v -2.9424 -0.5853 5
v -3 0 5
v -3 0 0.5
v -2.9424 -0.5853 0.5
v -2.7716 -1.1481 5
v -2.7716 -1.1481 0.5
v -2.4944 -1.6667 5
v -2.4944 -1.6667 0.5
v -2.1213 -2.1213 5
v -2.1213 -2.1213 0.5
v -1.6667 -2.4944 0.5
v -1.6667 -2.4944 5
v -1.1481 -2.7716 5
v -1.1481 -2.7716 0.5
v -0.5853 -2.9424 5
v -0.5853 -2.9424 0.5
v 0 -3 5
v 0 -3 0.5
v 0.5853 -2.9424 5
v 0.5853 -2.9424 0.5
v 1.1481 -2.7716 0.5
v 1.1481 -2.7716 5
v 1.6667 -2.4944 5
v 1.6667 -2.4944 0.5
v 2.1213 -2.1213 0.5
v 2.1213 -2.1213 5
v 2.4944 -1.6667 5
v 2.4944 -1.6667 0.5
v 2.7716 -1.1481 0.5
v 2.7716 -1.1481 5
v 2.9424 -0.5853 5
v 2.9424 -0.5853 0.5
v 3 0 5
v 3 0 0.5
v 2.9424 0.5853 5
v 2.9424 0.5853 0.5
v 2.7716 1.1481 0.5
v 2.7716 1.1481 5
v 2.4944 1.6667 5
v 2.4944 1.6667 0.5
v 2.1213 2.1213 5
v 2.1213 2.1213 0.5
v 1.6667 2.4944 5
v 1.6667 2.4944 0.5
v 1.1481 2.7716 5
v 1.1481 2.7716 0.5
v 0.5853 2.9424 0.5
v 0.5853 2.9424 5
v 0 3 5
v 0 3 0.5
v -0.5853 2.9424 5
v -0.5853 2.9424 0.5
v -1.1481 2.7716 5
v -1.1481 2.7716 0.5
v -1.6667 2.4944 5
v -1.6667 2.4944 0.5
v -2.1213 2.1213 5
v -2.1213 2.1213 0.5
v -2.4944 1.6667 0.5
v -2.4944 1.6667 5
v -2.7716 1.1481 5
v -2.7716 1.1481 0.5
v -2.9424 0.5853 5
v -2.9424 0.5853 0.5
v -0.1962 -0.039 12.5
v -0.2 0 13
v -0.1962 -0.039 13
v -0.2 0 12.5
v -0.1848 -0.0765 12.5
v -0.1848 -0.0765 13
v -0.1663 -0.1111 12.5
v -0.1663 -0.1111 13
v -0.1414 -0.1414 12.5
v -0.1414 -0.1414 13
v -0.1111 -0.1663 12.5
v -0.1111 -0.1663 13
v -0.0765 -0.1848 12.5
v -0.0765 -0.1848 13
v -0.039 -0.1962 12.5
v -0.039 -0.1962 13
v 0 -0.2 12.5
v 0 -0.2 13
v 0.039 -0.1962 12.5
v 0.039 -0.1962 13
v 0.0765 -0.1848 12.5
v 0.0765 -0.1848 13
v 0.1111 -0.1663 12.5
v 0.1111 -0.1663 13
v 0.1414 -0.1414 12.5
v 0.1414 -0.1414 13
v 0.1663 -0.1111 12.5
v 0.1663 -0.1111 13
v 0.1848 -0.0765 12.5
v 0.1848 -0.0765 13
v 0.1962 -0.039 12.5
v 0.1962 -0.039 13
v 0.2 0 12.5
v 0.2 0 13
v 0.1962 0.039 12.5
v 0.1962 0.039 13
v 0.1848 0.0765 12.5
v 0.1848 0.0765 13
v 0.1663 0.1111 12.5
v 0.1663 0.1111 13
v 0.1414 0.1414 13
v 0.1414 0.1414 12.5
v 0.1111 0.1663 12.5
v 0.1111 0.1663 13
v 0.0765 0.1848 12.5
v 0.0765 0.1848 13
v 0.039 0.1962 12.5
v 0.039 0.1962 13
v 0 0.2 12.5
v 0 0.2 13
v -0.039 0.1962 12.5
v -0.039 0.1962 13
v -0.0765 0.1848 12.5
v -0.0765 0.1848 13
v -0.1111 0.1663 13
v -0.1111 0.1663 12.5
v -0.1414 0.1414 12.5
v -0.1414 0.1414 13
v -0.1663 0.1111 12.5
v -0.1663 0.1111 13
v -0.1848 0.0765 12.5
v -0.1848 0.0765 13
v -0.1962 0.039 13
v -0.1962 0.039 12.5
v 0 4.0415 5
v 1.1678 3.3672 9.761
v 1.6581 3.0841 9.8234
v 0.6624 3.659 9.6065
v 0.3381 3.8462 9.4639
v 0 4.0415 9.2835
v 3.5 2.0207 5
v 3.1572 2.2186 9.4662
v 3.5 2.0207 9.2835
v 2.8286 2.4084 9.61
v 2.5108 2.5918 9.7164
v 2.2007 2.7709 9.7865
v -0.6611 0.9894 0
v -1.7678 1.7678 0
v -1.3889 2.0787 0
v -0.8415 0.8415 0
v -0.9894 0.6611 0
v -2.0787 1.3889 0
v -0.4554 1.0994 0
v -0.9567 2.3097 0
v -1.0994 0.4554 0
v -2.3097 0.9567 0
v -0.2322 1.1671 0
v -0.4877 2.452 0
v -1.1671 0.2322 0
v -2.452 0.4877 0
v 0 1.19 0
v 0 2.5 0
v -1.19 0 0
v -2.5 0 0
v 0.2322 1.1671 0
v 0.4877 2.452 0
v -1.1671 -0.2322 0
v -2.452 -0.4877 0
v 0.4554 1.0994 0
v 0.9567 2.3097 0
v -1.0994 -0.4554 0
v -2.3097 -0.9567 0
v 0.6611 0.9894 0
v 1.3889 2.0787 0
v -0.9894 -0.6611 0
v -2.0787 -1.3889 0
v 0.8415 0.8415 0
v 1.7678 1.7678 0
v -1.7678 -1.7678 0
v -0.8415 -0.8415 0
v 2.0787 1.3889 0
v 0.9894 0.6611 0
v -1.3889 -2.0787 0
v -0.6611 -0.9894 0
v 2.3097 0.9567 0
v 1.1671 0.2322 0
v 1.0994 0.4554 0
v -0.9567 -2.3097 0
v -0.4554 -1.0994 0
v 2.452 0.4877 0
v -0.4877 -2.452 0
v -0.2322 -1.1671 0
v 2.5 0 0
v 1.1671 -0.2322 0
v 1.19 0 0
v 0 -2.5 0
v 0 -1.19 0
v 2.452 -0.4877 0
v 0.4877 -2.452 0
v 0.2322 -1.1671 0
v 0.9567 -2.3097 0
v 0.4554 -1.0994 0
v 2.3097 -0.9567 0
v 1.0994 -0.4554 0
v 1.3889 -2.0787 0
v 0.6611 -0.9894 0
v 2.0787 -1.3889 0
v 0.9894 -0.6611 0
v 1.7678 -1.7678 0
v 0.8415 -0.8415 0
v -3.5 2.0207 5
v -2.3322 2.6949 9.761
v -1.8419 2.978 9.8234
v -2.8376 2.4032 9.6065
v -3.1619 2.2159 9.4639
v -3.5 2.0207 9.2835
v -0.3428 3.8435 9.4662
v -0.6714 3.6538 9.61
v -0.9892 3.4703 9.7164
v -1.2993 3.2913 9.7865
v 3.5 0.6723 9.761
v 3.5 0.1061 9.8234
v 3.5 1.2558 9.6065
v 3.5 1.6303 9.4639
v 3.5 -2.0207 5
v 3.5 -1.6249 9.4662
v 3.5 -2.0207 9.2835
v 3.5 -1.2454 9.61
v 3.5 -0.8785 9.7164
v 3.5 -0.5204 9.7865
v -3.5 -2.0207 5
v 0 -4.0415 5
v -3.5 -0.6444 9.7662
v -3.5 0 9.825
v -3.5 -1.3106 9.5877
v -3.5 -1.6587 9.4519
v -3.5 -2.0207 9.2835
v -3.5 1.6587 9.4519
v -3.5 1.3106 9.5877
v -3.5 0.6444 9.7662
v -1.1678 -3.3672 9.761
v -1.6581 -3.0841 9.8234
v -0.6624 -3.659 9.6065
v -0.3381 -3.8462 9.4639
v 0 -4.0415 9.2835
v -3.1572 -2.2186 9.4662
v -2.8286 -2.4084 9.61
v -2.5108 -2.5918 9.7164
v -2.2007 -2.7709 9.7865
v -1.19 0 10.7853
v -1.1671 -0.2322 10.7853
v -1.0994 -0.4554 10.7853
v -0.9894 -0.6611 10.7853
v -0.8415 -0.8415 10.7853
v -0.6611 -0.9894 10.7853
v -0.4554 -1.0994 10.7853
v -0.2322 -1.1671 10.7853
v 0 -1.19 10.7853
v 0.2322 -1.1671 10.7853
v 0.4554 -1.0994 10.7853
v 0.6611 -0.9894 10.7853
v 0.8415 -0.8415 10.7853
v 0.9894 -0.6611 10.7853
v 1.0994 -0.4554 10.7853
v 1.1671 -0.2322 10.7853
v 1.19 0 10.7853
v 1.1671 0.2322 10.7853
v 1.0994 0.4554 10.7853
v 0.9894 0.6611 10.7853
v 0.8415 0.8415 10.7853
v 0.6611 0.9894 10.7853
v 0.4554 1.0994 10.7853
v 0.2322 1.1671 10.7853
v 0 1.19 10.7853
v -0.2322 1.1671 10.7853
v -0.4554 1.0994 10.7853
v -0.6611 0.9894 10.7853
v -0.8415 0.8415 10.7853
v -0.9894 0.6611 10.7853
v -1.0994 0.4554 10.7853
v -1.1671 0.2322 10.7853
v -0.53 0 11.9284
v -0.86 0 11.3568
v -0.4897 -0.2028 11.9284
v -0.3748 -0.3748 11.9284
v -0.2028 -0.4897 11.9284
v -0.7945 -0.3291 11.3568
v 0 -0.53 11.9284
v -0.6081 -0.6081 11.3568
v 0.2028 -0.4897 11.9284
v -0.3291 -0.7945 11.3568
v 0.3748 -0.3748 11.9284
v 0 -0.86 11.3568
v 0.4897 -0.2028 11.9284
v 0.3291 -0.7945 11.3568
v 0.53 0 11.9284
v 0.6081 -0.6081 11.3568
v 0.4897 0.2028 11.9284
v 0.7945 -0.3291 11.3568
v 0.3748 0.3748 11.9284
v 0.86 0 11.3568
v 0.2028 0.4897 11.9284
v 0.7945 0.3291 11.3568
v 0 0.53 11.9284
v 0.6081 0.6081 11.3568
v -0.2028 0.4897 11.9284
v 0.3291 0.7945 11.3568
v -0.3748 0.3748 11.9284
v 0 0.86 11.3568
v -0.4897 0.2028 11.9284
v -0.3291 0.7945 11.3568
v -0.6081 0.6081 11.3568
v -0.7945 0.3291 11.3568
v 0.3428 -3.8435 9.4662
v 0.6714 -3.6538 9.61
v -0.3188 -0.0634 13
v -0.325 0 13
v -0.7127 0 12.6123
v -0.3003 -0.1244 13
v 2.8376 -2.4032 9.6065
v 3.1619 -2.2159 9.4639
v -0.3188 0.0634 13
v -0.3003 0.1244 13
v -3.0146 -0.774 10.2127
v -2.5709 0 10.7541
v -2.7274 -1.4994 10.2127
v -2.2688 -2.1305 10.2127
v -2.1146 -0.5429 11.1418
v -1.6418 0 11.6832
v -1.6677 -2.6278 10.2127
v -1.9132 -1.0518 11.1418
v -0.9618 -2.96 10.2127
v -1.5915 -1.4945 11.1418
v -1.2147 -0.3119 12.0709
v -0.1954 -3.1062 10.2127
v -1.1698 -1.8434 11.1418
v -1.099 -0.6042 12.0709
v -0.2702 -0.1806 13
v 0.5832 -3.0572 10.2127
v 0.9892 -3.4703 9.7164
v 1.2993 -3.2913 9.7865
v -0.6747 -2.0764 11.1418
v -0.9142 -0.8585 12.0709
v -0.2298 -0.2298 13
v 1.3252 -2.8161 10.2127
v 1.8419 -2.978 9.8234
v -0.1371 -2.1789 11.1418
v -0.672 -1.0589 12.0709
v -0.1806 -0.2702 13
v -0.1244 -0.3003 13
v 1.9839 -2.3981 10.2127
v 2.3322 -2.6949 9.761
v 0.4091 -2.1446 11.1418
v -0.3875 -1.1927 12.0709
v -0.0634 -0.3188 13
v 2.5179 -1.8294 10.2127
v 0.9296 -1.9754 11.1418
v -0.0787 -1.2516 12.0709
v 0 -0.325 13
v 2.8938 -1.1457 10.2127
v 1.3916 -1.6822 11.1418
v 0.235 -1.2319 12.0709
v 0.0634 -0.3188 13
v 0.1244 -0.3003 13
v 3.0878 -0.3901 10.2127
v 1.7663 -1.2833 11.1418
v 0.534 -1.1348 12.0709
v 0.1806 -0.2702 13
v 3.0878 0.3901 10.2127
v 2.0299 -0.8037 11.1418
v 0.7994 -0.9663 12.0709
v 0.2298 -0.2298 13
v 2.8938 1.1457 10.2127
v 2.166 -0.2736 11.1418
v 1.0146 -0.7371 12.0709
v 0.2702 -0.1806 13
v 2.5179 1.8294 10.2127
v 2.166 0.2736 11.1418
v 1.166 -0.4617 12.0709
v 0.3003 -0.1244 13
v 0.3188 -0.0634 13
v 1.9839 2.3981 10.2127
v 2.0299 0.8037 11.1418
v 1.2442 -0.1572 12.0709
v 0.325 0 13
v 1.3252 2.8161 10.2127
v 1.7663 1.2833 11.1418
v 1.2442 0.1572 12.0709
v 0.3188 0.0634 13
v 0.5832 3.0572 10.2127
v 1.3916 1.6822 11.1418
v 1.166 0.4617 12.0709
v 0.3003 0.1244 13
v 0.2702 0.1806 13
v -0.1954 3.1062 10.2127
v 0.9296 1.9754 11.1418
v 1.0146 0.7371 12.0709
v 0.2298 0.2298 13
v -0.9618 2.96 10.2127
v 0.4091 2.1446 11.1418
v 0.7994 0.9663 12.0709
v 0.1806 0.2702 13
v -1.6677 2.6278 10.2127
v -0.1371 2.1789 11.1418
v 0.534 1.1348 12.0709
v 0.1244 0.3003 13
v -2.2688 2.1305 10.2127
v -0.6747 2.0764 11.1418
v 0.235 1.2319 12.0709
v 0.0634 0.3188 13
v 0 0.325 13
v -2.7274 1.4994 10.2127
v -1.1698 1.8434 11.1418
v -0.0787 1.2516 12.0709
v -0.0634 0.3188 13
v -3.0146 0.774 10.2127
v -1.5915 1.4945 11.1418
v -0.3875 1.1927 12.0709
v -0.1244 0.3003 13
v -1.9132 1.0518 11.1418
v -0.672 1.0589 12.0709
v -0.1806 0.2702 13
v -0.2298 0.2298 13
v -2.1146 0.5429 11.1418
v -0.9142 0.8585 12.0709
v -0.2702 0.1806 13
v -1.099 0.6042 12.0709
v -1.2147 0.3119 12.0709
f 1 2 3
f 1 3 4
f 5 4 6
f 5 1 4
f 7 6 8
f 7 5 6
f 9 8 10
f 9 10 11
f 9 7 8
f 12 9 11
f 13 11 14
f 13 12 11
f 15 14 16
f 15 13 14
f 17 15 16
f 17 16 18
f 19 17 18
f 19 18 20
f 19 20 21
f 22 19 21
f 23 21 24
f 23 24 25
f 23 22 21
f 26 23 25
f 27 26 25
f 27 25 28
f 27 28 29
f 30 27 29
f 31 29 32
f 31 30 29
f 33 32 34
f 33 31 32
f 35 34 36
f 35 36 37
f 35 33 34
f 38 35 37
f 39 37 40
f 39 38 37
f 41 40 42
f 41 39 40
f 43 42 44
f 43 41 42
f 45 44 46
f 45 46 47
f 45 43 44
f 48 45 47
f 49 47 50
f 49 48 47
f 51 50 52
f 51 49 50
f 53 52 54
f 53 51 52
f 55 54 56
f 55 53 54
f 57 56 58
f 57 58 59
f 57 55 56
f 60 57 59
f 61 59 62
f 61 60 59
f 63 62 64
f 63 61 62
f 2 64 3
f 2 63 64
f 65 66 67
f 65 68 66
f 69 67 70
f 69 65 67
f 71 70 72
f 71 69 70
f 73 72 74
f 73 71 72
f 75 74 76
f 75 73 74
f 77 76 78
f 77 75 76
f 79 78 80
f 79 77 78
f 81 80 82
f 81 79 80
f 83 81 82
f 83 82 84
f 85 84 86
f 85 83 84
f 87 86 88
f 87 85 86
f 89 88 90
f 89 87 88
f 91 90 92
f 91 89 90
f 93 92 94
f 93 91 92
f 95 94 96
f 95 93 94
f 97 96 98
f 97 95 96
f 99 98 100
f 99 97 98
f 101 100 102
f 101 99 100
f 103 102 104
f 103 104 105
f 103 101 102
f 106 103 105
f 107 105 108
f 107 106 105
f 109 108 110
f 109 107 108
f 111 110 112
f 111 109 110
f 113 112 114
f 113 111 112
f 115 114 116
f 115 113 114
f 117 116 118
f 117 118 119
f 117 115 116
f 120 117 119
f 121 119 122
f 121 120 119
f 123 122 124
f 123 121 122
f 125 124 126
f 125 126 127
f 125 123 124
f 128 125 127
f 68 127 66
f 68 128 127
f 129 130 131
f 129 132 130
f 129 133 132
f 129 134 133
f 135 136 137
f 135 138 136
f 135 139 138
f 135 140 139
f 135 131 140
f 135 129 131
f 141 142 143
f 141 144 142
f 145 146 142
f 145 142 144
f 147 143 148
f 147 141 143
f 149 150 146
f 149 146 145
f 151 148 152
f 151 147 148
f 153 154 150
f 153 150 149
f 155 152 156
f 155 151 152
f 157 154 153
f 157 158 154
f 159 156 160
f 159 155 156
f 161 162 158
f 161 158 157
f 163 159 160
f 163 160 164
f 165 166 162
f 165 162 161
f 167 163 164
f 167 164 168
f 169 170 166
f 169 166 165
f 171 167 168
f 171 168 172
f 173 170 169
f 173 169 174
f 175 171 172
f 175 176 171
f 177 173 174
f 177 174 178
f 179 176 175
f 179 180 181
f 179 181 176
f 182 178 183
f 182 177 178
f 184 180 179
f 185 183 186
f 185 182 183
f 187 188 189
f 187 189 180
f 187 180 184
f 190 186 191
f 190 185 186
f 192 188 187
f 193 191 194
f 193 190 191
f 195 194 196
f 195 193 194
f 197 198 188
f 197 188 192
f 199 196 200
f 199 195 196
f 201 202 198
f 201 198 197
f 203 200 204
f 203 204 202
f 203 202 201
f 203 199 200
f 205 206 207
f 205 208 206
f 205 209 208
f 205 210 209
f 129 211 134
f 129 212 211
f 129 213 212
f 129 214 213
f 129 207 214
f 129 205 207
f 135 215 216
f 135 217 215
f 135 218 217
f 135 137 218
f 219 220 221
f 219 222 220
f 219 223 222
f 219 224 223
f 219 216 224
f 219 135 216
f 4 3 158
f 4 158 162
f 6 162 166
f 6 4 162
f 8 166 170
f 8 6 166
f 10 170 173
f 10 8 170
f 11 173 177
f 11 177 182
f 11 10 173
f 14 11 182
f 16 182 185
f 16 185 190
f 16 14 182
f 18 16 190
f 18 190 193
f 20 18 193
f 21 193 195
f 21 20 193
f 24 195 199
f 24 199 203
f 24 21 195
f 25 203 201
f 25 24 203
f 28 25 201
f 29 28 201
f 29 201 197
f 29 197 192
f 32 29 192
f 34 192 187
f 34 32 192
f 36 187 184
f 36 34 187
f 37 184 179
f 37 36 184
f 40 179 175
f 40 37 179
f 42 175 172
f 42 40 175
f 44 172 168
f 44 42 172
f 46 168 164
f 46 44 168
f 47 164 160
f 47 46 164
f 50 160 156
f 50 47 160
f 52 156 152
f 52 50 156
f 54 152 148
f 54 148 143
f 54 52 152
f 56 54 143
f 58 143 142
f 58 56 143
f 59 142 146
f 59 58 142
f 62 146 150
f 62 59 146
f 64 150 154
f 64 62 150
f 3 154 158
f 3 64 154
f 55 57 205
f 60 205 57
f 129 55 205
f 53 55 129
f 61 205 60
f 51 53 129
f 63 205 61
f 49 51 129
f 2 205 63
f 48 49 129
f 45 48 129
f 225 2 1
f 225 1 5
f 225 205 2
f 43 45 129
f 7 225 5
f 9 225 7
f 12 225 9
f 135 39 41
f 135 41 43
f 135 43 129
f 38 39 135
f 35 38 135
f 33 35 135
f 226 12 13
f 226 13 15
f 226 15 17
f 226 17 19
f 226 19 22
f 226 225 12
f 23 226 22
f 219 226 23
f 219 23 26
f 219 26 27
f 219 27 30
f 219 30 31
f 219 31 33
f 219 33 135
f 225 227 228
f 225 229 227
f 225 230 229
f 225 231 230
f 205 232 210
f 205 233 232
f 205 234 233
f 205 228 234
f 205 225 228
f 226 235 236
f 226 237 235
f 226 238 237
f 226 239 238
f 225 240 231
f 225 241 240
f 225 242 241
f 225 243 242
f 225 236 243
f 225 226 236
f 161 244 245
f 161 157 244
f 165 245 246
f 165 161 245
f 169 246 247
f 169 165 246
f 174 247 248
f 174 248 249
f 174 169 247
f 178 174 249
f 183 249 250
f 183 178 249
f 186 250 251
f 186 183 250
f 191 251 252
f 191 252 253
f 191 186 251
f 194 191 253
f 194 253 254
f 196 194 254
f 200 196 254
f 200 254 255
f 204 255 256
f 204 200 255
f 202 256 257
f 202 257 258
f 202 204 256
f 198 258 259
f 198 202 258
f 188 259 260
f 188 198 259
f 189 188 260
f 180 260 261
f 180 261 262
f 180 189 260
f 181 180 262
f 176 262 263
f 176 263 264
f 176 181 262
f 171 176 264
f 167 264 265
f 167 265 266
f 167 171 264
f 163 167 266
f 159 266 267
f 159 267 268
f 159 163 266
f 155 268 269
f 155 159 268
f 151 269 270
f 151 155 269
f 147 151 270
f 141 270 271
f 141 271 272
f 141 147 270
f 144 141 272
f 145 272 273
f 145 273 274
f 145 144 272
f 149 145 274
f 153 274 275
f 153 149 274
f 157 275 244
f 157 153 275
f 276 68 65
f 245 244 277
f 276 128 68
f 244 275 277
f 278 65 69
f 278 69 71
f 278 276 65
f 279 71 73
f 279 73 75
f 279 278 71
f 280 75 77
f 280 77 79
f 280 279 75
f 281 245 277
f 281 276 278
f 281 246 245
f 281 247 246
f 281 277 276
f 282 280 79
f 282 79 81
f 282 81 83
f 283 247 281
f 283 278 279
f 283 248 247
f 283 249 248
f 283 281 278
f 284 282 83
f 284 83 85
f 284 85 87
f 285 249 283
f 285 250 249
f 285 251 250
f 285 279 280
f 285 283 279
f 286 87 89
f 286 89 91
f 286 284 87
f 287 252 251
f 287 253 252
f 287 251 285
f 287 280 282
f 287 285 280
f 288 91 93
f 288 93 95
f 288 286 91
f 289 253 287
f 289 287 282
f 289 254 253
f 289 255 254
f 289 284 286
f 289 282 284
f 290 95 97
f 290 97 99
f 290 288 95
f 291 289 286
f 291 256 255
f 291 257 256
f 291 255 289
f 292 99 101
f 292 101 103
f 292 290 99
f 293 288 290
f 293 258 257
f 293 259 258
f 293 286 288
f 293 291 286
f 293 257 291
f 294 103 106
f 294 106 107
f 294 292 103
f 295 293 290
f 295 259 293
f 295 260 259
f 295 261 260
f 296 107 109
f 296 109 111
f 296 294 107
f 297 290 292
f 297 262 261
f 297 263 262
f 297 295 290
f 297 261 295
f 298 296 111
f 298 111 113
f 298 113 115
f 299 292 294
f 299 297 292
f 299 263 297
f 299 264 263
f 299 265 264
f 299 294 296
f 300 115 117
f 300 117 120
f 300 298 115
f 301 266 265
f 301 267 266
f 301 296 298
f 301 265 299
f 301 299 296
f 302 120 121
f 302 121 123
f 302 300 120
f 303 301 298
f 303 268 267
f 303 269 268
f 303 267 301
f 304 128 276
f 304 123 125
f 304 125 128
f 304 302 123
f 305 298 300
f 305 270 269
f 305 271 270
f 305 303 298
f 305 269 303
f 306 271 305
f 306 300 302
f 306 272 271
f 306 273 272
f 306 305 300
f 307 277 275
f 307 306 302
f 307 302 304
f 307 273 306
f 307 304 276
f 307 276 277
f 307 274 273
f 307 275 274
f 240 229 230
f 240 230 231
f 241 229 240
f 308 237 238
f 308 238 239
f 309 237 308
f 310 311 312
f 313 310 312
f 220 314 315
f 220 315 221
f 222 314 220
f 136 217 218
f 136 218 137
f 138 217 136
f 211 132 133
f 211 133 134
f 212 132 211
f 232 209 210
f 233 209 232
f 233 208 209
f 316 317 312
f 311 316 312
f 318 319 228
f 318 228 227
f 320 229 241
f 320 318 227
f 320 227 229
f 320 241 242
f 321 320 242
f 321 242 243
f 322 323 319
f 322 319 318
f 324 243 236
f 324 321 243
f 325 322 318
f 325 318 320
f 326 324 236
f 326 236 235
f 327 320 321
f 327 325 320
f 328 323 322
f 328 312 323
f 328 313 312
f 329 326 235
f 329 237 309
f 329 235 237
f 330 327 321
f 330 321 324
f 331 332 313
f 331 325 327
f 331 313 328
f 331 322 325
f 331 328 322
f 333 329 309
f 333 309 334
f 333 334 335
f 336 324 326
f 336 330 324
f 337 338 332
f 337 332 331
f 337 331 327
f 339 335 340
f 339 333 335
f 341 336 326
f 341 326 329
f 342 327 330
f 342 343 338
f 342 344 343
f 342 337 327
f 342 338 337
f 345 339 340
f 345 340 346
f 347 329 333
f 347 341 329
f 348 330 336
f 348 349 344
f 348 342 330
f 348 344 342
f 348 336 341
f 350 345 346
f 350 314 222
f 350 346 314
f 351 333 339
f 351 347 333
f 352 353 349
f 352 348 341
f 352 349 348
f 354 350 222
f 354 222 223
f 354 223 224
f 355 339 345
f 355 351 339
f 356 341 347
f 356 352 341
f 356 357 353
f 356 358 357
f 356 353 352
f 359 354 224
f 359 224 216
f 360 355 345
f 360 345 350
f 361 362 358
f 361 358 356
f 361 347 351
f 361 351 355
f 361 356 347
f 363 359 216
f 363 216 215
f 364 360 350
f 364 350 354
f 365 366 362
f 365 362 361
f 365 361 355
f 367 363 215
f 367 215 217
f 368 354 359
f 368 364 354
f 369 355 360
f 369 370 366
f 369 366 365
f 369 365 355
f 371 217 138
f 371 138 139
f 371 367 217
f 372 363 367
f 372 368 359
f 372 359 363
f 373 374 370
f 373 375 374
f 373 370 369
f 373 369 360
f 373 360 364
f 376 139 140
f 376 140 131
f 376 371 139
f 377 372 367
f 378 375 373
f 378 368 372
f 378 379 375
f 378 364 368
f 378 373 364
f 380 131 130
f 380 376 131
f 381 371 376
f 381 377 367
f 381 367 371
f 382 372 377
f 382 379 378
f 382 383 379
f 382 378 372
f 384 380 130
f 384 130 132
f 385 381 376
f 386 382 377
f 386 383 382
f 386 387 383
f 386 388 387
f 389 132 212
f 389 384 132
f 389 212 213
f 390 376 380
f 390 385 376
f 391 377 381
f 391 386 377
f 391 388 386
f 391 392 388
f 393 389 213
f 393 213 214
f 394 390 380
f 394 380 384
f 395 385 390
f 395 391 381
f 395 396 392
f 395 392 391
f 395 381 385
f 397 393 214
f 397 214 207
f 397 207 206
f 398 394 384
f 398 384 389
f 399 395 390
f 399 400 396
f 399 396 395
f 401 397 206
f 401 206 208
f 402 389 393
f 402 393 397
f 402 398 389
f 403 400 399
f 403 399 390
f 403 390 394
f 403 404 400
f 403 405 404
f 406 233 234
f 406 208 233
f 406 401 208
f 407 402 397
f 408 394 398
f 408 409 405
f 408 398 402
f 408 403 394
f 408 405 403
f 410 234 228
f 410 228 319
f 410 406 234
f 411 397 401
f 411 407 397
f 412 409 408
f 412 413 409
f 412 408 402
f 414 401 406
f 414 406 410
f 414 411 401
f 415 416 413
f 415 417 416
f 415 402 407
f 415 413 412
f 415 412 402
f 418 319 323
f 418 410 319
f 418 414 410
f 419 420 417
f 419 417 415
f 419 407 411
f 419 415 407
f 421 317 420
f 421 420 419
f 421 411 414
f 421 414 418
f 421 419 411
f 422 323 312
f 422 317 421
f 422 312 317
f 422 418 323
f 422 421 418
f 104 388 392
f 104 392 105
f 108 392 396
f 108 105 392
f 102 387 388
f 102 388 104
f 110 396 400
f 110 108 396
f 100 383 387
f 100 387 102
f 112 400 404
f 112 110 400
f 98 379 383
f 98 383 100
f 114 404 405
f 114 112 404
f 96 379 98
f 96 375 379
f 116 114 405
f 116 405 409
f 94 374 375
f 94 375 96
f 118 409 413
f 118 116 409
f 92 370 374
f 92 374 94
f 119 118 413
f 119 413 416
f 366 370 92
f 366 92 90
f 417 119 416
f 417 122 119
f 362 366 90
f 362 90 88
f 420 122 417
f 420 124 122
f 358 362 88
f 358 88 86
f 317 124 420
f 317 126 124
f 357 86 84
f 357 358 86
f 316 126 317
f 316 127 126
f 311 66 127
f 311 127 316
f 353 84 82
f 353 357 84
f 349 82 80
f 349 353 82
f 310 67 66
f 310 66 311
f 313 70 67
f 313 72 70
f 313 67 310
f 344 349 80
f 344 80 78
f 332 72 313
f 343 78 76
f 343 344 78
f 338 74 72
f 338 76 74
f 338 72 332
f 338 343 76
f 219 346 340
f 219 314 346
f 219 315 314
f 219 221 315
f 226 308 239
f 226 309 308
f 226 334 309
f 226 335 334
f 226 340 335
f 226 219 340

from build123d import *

# Parameters (mm, degrees)
SKETCH2_R          = 8.325
CUT_EXTRUDE2_DEPTH = 10
CHAMFER1_SIZE      = 0.5


with BuildPart() as part:
    # Sketch1 → Revolve1 (revolve)
    with BuildSketch(Plane(origin=(0, 0, 0), x_dir=(1, 0, 0), z_dir=(0, 1, 0)), mode=Mode.PRIVATE) as revolve1_sk:
        Polygon((1.19, 0), (3, 0), (3, -5), (8.325, -5), (0.325, -13), (0.2, -13), (0.2, -12.5), (1.19, -10.785269701), align=None)
    revolve(revolve1_sk.sketch.rotate(Axis((0, 0, 0), (0, 0, 1)), 180), axis=Axis((0, 0, 0), (0, 0, 1)))

    # Sketch2 → Cut-Extrude2 (cut)
    with BuildSketch(Plane(origin=(0, 0, 5), x_dir=(-1, 0, 0), z_dir=(0, 0, -1))):
        Circle(SKETCH2_R)
        Polygon((3.5, 2.020725942), (0, 4.041451884), (-3.5, 2.020725942), (-3.5, -2.020725942), (0, -4.041451884), (3.5, -2.020725942), align=None, mode=Mode.SUBTRACT)
    extrude(amount=-CUT_EXTRUDE2_DEPTH, mode=Mode.SUBTRACT)

    # Chamfer1
    chamfer1_edges = [part.edges().sort_by_distance(p)[0] for p in [
        (3, 0, 0),
    ]]
    chamfer(chamfer1_edges, length=CHAMFER1_SIZE)


solid = part.part
